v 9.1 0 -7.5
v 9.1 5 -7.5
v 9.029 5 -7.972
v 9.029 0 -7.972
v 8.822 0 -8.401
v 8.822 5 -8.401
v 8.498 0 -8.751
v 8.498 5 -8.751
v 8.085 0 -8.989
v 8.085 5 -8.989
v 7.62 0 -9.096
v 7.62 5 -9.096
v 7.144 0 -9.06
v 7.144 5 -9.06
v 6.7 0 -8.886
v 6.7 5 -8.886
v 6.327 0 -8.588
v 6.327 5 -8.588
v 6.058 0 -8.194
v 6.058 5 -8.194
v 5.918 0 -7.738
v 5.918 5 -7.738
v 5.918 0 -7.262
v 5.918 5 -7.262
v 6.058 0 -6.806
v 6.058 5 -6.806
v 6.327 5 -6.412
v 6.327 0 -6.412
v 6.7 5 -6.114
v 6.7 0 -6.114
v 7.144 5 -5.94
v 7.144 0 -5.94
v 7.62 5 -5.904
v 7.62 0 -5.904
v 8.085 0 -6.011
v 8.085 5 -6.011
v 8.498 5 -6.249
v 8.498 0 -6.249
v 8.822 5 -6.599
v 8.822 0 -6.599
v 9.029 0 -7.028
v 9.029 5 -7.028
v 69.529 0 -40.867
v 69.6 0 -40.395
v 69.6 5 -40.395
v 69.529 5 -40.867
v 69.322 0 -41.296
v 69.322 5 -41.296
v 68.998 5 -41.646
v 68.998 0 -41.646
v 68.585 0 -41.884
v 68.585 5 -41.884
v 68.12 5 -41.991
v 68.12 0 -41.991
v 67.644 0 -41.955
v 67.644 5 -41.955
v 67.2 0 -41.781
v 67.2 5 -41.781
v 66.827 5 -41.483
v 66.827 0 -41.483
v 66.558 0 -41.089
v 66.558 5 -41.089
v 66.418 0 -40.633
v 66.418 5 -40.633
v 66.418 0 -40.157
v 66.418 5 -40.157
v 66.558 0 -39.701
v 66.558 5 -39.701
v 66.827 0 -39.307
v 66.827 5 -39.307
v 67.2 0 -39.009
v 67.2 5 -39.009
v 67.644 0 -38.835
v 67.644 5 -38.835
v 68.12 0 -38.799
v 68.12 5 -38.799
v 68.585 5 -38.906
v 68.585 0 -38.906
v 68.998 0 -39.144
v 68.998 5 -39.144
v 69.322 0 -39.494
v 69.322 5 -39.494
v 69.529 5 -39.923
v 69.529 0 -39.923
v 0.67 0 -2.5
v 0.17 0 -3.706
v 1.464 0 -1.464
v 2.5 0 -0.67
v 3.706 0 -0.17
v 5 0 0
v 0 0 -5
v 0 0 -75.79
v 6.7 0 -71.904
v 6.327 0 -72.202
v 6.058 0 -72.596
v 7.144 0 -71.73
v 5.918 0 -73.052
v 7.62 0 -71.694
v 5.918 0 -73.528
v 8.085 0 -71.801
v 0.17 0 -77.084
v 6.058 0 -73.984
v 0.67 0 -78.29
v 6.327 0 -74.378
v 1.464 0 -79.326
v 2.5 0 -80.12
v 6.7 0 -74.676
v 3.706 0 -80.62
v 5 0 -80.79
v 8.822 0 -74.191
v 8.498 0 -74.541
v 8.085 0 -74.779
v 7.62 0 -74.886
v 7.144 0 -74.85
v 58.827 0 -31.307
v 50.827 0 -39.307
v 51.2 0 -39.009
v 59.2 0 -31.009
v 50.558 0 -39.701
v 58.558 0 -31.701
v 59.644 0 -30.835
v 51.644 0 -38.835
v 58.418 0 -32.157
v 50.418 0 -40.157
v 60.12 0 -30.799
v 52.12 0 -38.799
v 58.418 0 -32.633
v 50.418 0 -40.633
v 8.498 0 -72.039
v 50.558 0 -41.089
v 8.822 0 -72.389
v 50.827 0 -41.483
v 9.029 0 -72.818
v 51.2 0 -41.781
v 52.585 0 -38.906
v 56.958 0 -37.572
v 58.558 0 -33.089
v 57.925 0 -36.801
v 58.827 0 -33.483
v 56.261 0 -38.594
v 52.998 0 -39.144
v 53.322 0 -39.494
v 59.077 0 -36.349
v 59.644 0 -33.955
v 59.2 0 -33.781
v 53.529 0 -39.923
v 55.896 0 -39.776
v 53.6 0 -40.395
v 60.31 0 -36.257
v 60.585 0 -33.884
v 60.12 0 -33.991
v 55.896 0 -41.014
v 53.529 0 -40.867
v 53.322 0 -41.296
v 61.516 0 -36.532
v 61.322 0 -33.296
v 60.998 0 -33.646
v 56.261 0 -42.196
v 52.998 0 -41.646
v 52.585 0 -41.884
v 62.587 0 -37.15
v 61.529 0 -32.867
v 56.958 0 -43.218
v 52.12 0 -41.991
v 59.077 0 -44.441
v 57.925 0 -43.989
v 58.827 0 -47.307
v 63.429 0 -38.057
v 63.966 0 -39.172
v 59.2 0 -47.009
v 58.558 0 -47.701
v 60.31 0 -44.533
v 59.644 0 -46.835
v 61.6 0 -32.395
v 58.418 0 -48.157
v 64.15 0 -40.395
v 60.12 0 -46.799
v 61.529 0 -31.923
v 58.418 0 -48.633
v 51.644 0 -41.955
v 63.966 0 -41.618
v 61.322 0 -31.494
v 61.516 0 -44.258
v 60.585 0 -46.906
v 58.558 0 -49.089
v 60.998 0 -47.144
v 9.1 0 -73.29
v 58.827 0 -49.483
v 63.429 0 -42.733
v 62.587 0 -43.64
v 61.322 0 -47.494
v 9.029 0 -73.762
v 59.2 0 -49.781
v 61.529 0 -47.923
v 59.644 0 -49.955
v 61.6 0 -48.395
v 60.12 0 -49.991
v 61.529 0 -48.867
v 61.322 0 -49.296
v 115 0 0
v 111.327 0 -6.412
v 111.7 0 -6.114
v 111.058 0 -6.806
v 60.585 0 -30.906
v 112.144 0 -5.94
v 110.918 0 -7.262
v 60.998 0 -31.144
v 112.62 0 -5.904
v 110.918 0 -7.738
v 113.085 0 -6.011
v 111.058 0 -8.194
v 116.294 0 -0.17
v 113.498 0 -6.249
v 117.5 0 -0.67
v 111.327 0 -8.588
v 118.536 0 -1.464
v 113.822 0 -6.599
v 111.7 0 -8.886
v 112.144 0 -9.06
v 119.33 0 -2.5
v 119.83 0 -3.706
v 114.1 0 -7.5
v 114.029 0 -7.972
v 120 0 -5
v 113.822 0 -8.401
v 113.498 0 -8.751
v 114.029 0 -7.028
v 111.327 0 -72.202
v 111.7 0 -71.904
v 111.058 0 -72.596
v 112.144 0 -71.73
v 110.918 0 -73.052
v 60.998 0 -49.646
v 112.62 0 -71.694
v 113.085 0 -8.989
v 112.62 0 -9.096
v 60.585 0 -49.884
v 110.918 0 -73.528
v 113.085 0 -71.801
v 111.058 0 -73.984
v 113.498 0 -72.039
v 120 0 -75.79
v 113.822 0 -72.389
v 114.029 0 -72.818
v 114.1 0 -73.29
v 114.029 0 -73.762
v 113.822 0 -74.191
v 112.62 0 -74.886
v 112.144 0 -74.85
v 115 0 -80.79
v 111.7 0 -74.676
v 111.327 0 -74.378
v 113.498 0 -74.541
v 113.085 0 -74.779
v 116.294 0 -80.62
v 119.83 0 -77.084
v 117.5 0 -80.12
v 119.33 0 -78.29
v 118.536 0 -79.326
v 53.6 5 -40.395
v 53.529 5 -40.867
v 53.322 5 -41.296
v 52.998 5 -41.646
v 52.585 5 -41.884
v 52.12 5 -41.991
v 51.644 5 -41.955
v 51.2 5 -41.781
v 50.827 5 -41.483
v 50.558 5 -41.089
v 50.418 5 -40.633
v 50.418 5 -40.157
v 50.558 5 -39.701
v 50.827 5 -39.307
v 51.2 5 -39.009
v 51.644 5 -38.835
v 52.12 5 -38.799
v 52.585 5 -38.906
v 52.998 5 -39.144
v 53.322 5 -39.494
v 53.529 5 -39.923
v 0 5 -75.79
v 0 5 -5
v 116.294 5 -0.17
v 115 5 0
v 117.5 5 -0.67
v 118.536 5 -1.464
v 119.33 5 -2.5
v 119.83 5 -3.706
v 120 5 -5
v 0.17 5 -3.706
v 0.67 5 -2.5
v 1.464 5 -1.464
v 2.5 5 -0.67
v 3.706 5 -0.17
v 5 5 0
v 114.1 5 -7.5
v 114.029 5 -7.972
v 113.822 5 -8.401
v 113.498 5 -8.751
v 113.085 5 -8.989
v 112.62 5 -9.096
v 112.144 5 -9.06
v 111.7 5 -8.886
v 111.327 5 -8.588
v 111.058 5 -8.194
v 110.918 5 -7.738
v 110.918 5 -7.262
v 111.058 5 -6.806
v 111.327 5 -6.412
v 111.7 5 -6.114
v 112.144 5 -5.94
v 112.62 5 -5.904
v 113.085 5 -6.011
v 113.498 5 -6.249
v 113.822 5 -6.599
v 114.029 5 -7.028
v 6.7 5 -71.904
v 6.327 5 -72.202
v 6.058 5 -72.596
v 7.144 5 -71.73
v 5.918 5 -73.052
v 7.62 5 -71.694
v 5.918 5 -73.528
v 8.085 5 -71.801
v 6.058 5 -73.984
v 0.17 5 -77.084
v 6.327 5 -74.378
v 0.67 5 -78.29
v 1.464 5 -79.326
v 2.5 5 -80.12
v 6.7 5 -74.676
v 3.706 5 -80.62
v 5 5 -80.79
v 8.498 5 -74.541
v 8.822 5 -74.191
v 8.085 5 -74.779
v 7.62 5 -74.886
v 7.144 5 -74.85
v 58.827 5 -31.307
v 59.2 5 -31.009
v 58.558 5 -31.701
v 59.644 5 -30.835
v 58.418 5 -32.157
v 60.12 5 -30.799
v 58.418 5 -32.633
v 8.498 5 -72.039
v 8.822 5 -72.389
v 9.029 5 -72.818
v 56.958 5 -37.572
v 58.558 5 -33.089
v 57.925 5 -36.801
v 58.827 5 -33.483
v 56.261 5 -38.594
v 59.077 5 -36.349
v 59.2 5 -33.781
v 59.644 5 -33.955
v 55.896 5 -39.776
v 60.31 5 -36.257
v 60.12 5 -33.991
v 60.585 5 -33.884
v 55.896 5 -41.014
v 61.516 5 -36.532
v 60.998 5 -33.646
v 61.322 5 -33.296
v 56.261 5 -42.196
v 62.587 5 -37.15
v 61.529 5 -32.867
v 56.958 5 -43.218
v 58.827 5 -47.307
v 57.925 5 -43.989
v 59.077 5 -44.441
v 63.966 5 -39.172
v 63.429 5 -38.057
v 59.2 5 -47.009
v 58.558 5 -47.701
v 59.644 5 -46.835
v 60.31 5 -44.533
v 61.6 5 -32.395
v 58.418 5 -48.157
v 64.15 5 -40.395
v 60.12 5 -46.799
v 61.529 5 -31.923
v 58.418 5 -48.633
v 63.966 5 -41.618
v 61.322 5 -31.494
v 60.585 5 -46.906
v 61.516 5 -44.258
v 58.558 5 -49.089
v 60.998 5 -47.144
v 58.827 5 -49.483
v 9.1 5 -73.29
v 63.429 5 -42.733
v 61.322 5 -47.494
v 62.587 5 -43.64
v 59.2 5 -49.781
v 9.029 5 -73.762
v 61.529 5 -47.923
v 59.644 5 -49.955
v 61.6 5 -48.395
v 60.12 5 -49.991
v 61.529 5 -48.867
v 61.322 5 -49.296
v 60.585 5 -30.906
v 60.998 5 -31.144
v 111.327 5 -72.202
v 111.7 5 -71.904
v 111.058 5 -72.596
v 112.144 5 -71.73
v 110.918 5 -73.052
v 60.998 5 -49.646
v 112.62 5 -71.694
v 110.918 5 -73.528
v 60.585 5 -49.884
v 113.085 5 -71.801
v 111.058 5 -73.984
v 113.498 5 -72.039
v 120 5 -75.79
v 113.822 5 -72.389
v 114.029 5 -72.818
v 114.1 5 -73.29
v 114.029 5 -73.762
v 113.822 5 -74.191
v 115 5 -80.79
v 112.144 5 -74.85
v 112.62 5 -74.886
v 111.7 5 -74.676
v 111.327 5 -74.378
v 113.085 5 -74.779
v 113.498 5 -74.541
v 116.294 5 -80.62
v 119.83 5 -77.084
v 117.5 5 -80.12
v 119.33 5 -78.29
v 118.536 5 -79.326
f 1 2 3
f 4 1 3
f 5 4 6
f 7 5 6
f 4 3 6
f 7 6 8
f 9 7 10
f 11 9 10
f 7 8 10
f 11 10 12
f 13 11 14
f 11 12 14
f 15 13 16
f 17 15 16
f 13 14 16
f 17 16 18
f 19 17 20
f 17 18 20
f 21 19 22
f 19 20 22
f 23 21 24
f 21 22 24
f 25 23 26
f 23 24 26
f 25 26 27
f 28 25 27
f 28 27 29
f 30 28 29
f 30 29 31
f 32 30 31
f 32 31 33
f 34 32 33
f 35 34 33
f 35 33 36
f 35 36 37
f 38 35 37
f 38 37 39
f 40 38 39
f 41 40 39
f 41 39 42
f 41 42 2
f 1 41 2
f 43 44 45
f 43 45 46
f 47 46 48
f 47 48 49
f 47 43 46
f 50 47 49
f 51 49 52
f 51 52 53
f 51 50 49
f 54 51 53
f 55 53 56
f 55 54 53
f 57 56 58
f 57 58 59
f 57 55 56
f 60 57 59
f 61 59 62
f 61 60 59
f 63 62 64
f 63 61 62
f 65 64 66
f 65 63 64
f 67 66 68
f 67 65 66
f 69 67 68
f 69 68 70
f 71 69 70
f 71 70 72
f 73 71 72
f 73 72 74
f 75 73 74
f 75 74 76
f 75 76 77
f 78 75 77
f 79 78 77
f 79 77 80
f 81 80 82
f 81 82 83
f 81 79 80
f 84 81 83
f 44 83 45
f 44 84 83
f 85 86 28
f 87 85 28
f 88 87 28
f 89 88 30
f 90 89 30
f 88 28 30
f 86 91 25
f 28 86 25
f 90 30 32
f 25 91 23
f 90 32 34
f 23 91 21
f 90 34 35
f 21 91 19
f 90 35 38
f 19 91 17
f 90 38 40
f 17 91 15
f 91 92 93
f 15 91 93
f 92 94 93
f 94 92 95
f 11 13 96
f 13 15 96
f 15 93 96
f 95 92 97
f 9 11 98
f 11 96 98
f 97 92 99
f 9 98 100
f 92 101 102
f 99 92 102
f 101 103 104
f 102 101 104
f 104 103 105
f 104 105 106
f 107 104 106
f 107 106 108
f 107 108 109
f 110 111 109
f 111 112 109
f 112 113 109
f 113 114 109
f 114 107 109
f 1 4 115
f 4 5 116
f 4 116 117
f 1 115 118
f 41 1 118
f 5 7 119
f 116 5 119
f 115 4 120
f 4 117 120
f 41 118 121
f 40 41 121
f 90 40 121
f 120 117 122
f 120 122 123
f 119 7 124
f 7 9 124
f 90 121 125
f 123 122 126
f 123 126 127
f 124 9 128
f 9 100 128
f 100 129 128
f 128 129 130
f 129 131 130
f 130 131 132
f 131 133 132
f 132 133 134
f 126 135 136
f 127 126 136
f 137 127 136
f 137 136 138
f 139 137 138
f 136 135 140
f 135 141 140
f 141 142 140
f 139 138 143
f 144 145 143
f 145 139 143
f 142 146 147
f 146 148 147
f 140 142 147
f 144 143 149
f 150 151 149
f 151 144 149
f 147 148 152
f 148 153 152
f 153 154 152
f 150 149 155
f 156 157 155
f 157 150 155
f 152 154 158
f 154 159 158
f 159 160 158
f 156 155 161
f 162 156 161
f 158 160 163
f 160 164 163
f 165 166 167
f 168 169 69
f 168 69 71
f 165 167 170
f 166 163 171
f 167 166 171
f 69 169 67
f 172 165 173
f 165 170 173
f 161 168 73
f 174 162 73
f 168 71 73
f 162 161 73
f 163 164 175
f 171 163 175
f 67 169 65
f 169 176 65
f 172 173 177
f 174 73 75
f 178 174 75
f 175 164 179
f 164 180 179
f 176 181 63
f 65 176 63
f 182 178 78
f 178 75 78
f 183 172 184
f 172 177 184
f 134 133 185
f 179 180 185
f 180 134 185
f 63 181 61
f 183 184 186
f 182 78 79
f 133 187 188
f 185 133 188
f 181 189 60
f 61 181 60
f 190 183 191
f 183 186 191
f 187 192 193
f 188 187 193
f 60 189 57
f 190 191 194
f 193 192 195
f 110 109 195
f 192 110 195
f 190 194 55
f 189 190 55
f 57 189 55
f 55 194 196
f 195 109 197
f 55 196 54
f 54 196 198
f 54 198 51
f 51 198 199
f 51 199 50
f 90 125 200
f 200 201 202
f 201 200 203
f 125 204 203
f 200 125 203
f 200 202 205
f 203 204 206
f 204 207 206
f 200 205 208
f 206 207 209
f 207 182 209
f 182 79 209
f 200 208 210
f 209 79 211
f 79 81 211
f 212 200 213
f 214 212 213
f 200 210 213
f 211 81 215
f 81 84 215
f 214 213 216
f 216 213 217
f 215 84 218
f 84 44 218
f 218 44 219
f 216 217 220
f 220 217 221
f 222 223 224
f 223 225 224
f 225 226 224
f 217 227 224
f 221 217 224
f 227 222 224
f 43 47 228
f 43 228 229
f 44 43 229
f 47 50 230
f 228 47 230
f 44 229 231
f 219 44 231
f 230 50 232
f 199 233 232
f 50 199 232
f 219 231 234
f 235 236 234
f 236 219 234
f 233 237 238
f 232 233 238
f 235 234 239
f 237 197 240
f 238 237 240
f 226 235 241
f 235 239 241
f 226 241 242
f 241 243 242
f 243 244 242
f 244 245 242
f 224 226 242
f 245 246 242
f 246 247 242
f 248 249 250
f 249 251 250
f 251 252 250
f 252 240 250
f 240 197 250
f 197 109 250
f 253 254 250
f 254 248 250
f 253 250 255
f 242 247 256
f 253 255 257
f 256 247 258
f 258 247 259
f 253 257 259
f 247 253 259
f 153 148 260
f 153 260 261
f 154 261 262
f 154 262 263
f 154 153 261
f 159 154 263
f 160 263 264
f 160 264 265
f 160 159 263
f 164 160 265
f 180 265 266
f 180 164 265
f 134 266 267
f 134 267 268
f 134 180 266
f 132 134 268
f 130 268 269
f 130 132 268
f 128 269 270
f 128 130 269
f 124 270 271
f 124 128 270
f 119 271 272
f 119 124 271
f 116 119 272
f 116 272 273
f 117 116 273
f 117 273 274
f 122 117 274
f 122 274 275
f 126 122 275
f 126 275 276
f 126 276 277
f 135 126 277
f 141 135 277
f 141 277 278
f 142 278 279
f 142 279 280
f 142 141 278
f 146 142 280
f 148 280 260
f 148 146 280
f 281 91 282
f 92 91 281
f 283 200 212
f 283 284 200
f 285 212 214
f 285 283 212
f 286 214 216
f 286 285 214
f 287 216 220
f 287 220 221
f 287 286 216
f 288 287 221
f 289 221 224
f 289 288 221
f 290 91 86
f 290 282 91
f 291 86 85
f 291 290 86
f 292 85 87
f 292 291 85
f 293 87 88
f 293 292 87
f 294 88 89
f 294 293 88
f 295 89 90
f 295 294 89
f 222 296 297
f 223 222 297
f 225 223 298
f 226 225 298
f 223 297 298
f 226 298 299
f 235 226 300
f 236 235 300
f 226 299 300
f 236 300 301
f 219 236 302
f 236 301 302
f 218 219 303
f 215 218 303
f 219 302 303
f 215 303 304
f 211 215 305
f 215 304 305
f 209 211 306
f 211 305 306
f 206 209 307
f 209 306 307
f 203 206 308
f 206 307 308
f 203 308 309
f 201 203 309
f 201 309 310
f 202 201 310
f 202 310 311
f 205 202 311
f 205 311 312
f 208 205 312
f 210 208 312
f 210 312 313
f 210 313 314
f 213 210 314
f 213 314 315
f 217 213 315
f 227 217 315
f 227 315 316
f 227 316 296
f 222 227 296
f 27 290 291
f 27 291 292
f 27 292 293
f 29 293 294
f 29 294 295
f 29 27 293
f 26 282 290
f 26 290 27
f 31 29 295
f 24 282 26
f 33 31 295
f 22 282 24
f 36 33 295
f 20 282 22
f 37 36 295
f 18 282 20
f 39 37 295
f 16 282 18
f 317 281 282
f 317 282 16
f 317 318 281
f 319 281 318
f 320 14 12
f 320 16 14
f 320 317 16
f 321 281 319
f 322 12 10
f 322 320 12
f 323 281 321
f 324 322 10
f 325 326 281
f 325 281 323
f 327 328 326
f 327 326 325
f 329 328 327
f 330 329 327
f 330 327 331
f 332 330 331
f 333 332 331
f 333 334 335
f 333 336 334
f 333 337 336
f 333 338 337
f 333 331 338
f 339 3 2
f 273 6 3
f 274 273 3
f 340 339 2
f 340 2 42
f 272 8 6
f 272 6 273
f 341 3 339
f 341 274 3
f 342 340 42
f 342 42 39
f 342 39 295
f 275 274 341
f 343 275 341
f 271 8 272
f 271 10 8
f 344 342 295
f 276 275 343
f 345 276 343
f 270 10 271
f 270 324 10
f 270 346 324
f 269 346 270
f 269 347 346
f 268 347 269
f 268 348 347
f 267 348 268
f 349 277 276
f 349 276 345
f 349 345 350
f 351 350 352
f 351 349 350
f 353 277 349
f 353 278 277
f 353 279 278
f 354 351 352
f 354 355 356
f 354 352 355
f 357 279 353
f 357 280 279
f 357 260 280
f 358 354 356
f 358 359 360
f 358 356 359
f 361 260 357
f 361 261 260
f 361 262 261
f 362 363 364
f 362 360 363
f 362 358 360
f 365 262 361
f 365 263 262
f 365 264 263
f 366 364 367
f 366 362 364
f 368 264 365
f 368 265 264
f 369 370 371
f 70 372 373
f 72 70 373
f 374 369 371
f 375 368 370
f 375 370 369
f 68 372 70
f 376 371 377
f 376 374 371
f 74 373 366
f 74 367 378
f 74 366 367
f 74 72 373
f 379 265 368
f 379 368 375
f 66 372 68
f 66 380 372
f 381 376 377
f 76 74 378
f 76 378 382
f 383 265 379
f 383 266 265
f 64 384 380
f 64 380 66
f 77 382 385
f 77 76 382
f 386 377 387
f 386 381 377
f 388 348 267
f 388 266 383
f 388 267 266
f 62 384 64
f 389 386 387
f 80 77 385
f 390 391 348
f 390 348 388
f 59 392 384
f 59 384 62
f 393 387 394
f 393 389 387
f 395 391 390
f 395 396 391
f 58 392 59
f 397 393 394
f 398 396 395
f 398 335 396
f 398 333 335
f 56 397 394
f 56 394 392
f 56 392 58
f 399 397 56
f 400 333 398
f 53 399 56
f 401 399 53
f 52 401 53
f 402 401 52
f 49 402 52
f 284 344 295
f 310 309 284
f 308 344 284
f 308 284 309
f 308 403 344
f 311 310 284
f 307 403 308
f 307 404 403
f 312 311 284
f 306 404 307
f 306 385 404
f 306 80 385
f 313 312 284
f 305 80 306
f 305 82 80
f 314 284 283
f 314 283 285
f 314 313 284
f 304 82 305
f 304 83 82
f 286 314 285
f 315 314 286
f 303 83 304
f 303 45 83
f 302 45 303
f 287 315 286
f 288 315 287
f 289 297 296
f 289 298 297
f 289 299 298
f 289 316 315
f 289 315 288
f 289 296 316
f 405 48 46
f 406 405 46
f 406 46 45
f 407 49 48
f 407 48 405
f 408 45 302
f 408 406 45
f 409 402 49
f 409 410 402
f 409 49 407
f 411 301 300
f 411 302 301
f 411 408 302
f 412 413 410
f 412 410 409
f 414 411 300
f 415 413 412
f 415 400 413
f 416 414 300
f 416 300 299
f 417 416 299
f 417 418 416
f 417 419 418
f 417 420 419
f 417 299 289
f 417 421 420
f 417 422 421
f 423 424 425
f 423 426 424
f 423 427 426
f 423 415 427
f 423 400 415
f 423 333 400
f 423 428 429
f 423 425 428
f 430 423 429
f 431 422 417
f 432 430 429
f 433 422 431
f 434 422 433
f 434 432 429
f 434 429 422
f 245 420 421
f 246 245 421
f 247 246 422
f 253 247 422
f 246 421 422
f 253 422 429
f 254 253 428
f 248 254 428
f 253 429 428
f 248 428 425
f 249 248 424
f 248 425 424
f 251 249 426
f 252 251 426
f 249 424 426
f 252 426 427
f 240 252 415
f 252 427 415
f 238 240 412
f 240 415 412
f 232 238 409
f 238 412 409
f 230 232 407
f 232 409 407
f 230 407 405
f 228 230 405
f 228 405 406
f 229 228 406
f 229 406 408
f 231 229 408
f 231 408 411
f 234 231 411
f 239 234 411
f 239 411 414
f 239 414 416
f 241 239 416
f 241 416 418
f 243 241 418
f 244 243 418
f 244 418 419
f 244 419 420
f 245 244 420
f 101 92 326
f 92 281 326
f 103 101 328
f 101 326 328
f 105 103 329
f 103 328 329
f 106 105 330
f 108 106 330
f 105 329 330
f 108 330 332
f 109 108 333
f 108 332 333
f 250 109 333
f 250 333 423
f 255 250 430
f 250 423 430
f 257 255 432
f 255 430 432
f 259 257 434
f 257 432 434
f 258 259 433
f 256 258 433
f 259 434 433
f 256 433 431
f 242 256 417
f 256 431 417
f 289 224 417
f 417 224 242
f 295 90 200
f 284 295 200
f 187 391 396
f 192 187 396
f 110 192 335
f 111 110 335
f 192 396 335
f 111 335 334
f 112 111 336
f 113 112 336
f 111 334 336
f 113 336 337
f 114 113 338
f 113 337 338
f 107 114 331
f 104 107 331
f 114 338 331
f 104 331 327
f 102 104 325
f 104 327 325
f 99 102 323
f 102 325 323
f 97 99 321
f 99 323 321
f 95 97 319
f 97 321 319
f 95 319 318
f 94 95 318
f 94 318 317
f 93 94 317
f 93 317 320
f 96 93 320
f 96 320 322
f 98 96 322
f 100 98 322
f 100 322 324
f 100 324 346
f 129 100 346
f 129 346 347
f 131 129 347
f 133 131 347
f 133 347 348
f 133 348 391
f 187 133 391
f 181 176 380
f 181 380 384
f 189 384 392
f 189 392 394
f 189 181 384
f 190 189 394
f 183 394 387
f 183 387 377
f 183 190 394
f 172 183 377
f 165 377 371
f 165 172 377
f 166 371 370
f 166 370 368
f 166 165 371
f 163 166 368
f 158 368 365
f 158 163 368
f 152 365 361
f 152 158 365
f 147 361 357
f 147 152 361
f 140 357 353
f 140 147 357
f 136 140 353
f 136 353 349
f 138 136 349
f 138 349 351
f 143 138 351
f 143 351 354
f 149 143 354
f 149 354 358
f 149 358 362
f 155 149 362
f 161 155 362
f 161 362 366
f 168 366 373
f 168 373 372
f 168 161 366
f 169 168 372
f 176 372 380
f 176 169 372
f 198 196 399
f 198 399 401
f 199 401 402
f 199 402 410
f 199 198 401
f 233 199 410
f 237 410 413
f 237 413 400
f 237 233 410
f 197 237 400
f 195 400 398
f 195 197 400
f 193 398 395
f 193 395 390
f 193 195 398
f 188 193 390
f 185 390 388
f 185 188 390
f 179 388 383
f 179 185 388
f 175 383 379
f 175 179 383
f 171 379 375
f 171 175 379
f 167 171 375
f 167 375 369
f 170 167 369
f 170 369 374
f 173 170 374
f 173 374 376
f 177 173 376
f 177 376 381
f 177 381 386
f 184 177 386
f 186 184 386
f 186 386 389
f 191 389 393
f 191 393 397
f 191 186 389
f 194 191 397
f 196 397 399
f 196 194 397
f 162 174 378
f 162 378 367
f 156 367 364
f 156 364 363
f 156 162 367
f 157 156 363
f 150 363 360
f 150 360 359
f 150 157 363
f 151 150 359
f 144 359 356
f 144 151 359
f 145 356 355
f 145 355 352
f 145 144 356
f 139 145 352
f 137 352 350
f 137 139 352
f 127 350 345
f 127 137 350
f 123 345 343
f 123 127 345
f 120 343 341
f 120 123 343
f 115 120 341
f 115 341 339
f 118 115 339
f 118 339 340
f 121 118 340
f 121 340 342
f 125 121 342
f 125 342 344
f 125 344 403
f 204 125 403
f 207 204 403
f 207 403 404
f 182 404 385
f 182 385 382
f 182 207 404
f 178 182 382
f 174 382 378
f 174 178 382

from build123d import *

# Parameters (mm, degrees)
SKETCH1_W           = 120
SKETCH1_H           = 80.79
SKETCH1_R           = 1.6
SKETCH1_R_2         = 4.15
BOSS_EXTRUDE1_DEPTH = 5
SKETCH2_R           = 1.6
CUT_EXTRUDE1_DEPTH  = 6
FILLET1_R           = 5


with BuildPart() as part:
    # Sketch1 → Boss-Extrude1 (new body)
    with BuildSketch(Plane(origin=(0, 0, 0), x_dir=(1, 0, 0), z_dir=(0, 1, 0))):
        with Locations((60, 40.395)):
            Rectangle(SKETCH1_W, SKETCH1_H)
        with Locations((52, 40.395)):
            Circle(SKETCH1_R, mode=Mode.SUBTRACT)
        with Locations((60, 48.395)):
            Circle(SKETCH1_R, mode=Mode.SUBTRACT)
        with Locations((68, 40.395)):
            Circle(SKETCH1_R, mode=Mode.SUBTRACT)
        with Locations((60, 32.395)):
            Circle(SKETCH1_R, mode=Mode.SUBTRACT)
        with Locations((60, 40.395)):
            Circle(SKETCH1_R_2, mode=Mode.SUBTRACT)
    extrude(amount=BOSS_EXTRUDE1_DEPTH)

    # Sketch2 → Cut-Extrude1 (cut, through all)
    with BuildSketch(Plane(origin=(0, 5, 0), x_dir=(1, 0, 0), z_dir=(0, 1, 0))):
        with Locations((7.5, 7.5)):
            Circle(SKETCH2_R)
        with Locations((7.5, 73.29)):
            Circle(SKETCH2_R)
        with Locations((112.5, 7.5)):
            Circle(SKETCH2_R)
        with Locations((112.5, 73.29)):
            Circle(SKETCH2_R)
    extrude(amount=-CUT_EXTRUDE1_DEPTH, mode=Mode.SUBTRACT)

    # Fillet1
    fillet1_edges = [part.edges().sort_by_distance(p)[0] for p in [
        (0, 2.5, -80.79),
        (120, 2.5, -80.79),
        (120, 2.5, 0),
        (0, 2.5, 0),
    ]]
    fillet(fillet1_edges, radius=FILLET1_R)


solid = part.part
